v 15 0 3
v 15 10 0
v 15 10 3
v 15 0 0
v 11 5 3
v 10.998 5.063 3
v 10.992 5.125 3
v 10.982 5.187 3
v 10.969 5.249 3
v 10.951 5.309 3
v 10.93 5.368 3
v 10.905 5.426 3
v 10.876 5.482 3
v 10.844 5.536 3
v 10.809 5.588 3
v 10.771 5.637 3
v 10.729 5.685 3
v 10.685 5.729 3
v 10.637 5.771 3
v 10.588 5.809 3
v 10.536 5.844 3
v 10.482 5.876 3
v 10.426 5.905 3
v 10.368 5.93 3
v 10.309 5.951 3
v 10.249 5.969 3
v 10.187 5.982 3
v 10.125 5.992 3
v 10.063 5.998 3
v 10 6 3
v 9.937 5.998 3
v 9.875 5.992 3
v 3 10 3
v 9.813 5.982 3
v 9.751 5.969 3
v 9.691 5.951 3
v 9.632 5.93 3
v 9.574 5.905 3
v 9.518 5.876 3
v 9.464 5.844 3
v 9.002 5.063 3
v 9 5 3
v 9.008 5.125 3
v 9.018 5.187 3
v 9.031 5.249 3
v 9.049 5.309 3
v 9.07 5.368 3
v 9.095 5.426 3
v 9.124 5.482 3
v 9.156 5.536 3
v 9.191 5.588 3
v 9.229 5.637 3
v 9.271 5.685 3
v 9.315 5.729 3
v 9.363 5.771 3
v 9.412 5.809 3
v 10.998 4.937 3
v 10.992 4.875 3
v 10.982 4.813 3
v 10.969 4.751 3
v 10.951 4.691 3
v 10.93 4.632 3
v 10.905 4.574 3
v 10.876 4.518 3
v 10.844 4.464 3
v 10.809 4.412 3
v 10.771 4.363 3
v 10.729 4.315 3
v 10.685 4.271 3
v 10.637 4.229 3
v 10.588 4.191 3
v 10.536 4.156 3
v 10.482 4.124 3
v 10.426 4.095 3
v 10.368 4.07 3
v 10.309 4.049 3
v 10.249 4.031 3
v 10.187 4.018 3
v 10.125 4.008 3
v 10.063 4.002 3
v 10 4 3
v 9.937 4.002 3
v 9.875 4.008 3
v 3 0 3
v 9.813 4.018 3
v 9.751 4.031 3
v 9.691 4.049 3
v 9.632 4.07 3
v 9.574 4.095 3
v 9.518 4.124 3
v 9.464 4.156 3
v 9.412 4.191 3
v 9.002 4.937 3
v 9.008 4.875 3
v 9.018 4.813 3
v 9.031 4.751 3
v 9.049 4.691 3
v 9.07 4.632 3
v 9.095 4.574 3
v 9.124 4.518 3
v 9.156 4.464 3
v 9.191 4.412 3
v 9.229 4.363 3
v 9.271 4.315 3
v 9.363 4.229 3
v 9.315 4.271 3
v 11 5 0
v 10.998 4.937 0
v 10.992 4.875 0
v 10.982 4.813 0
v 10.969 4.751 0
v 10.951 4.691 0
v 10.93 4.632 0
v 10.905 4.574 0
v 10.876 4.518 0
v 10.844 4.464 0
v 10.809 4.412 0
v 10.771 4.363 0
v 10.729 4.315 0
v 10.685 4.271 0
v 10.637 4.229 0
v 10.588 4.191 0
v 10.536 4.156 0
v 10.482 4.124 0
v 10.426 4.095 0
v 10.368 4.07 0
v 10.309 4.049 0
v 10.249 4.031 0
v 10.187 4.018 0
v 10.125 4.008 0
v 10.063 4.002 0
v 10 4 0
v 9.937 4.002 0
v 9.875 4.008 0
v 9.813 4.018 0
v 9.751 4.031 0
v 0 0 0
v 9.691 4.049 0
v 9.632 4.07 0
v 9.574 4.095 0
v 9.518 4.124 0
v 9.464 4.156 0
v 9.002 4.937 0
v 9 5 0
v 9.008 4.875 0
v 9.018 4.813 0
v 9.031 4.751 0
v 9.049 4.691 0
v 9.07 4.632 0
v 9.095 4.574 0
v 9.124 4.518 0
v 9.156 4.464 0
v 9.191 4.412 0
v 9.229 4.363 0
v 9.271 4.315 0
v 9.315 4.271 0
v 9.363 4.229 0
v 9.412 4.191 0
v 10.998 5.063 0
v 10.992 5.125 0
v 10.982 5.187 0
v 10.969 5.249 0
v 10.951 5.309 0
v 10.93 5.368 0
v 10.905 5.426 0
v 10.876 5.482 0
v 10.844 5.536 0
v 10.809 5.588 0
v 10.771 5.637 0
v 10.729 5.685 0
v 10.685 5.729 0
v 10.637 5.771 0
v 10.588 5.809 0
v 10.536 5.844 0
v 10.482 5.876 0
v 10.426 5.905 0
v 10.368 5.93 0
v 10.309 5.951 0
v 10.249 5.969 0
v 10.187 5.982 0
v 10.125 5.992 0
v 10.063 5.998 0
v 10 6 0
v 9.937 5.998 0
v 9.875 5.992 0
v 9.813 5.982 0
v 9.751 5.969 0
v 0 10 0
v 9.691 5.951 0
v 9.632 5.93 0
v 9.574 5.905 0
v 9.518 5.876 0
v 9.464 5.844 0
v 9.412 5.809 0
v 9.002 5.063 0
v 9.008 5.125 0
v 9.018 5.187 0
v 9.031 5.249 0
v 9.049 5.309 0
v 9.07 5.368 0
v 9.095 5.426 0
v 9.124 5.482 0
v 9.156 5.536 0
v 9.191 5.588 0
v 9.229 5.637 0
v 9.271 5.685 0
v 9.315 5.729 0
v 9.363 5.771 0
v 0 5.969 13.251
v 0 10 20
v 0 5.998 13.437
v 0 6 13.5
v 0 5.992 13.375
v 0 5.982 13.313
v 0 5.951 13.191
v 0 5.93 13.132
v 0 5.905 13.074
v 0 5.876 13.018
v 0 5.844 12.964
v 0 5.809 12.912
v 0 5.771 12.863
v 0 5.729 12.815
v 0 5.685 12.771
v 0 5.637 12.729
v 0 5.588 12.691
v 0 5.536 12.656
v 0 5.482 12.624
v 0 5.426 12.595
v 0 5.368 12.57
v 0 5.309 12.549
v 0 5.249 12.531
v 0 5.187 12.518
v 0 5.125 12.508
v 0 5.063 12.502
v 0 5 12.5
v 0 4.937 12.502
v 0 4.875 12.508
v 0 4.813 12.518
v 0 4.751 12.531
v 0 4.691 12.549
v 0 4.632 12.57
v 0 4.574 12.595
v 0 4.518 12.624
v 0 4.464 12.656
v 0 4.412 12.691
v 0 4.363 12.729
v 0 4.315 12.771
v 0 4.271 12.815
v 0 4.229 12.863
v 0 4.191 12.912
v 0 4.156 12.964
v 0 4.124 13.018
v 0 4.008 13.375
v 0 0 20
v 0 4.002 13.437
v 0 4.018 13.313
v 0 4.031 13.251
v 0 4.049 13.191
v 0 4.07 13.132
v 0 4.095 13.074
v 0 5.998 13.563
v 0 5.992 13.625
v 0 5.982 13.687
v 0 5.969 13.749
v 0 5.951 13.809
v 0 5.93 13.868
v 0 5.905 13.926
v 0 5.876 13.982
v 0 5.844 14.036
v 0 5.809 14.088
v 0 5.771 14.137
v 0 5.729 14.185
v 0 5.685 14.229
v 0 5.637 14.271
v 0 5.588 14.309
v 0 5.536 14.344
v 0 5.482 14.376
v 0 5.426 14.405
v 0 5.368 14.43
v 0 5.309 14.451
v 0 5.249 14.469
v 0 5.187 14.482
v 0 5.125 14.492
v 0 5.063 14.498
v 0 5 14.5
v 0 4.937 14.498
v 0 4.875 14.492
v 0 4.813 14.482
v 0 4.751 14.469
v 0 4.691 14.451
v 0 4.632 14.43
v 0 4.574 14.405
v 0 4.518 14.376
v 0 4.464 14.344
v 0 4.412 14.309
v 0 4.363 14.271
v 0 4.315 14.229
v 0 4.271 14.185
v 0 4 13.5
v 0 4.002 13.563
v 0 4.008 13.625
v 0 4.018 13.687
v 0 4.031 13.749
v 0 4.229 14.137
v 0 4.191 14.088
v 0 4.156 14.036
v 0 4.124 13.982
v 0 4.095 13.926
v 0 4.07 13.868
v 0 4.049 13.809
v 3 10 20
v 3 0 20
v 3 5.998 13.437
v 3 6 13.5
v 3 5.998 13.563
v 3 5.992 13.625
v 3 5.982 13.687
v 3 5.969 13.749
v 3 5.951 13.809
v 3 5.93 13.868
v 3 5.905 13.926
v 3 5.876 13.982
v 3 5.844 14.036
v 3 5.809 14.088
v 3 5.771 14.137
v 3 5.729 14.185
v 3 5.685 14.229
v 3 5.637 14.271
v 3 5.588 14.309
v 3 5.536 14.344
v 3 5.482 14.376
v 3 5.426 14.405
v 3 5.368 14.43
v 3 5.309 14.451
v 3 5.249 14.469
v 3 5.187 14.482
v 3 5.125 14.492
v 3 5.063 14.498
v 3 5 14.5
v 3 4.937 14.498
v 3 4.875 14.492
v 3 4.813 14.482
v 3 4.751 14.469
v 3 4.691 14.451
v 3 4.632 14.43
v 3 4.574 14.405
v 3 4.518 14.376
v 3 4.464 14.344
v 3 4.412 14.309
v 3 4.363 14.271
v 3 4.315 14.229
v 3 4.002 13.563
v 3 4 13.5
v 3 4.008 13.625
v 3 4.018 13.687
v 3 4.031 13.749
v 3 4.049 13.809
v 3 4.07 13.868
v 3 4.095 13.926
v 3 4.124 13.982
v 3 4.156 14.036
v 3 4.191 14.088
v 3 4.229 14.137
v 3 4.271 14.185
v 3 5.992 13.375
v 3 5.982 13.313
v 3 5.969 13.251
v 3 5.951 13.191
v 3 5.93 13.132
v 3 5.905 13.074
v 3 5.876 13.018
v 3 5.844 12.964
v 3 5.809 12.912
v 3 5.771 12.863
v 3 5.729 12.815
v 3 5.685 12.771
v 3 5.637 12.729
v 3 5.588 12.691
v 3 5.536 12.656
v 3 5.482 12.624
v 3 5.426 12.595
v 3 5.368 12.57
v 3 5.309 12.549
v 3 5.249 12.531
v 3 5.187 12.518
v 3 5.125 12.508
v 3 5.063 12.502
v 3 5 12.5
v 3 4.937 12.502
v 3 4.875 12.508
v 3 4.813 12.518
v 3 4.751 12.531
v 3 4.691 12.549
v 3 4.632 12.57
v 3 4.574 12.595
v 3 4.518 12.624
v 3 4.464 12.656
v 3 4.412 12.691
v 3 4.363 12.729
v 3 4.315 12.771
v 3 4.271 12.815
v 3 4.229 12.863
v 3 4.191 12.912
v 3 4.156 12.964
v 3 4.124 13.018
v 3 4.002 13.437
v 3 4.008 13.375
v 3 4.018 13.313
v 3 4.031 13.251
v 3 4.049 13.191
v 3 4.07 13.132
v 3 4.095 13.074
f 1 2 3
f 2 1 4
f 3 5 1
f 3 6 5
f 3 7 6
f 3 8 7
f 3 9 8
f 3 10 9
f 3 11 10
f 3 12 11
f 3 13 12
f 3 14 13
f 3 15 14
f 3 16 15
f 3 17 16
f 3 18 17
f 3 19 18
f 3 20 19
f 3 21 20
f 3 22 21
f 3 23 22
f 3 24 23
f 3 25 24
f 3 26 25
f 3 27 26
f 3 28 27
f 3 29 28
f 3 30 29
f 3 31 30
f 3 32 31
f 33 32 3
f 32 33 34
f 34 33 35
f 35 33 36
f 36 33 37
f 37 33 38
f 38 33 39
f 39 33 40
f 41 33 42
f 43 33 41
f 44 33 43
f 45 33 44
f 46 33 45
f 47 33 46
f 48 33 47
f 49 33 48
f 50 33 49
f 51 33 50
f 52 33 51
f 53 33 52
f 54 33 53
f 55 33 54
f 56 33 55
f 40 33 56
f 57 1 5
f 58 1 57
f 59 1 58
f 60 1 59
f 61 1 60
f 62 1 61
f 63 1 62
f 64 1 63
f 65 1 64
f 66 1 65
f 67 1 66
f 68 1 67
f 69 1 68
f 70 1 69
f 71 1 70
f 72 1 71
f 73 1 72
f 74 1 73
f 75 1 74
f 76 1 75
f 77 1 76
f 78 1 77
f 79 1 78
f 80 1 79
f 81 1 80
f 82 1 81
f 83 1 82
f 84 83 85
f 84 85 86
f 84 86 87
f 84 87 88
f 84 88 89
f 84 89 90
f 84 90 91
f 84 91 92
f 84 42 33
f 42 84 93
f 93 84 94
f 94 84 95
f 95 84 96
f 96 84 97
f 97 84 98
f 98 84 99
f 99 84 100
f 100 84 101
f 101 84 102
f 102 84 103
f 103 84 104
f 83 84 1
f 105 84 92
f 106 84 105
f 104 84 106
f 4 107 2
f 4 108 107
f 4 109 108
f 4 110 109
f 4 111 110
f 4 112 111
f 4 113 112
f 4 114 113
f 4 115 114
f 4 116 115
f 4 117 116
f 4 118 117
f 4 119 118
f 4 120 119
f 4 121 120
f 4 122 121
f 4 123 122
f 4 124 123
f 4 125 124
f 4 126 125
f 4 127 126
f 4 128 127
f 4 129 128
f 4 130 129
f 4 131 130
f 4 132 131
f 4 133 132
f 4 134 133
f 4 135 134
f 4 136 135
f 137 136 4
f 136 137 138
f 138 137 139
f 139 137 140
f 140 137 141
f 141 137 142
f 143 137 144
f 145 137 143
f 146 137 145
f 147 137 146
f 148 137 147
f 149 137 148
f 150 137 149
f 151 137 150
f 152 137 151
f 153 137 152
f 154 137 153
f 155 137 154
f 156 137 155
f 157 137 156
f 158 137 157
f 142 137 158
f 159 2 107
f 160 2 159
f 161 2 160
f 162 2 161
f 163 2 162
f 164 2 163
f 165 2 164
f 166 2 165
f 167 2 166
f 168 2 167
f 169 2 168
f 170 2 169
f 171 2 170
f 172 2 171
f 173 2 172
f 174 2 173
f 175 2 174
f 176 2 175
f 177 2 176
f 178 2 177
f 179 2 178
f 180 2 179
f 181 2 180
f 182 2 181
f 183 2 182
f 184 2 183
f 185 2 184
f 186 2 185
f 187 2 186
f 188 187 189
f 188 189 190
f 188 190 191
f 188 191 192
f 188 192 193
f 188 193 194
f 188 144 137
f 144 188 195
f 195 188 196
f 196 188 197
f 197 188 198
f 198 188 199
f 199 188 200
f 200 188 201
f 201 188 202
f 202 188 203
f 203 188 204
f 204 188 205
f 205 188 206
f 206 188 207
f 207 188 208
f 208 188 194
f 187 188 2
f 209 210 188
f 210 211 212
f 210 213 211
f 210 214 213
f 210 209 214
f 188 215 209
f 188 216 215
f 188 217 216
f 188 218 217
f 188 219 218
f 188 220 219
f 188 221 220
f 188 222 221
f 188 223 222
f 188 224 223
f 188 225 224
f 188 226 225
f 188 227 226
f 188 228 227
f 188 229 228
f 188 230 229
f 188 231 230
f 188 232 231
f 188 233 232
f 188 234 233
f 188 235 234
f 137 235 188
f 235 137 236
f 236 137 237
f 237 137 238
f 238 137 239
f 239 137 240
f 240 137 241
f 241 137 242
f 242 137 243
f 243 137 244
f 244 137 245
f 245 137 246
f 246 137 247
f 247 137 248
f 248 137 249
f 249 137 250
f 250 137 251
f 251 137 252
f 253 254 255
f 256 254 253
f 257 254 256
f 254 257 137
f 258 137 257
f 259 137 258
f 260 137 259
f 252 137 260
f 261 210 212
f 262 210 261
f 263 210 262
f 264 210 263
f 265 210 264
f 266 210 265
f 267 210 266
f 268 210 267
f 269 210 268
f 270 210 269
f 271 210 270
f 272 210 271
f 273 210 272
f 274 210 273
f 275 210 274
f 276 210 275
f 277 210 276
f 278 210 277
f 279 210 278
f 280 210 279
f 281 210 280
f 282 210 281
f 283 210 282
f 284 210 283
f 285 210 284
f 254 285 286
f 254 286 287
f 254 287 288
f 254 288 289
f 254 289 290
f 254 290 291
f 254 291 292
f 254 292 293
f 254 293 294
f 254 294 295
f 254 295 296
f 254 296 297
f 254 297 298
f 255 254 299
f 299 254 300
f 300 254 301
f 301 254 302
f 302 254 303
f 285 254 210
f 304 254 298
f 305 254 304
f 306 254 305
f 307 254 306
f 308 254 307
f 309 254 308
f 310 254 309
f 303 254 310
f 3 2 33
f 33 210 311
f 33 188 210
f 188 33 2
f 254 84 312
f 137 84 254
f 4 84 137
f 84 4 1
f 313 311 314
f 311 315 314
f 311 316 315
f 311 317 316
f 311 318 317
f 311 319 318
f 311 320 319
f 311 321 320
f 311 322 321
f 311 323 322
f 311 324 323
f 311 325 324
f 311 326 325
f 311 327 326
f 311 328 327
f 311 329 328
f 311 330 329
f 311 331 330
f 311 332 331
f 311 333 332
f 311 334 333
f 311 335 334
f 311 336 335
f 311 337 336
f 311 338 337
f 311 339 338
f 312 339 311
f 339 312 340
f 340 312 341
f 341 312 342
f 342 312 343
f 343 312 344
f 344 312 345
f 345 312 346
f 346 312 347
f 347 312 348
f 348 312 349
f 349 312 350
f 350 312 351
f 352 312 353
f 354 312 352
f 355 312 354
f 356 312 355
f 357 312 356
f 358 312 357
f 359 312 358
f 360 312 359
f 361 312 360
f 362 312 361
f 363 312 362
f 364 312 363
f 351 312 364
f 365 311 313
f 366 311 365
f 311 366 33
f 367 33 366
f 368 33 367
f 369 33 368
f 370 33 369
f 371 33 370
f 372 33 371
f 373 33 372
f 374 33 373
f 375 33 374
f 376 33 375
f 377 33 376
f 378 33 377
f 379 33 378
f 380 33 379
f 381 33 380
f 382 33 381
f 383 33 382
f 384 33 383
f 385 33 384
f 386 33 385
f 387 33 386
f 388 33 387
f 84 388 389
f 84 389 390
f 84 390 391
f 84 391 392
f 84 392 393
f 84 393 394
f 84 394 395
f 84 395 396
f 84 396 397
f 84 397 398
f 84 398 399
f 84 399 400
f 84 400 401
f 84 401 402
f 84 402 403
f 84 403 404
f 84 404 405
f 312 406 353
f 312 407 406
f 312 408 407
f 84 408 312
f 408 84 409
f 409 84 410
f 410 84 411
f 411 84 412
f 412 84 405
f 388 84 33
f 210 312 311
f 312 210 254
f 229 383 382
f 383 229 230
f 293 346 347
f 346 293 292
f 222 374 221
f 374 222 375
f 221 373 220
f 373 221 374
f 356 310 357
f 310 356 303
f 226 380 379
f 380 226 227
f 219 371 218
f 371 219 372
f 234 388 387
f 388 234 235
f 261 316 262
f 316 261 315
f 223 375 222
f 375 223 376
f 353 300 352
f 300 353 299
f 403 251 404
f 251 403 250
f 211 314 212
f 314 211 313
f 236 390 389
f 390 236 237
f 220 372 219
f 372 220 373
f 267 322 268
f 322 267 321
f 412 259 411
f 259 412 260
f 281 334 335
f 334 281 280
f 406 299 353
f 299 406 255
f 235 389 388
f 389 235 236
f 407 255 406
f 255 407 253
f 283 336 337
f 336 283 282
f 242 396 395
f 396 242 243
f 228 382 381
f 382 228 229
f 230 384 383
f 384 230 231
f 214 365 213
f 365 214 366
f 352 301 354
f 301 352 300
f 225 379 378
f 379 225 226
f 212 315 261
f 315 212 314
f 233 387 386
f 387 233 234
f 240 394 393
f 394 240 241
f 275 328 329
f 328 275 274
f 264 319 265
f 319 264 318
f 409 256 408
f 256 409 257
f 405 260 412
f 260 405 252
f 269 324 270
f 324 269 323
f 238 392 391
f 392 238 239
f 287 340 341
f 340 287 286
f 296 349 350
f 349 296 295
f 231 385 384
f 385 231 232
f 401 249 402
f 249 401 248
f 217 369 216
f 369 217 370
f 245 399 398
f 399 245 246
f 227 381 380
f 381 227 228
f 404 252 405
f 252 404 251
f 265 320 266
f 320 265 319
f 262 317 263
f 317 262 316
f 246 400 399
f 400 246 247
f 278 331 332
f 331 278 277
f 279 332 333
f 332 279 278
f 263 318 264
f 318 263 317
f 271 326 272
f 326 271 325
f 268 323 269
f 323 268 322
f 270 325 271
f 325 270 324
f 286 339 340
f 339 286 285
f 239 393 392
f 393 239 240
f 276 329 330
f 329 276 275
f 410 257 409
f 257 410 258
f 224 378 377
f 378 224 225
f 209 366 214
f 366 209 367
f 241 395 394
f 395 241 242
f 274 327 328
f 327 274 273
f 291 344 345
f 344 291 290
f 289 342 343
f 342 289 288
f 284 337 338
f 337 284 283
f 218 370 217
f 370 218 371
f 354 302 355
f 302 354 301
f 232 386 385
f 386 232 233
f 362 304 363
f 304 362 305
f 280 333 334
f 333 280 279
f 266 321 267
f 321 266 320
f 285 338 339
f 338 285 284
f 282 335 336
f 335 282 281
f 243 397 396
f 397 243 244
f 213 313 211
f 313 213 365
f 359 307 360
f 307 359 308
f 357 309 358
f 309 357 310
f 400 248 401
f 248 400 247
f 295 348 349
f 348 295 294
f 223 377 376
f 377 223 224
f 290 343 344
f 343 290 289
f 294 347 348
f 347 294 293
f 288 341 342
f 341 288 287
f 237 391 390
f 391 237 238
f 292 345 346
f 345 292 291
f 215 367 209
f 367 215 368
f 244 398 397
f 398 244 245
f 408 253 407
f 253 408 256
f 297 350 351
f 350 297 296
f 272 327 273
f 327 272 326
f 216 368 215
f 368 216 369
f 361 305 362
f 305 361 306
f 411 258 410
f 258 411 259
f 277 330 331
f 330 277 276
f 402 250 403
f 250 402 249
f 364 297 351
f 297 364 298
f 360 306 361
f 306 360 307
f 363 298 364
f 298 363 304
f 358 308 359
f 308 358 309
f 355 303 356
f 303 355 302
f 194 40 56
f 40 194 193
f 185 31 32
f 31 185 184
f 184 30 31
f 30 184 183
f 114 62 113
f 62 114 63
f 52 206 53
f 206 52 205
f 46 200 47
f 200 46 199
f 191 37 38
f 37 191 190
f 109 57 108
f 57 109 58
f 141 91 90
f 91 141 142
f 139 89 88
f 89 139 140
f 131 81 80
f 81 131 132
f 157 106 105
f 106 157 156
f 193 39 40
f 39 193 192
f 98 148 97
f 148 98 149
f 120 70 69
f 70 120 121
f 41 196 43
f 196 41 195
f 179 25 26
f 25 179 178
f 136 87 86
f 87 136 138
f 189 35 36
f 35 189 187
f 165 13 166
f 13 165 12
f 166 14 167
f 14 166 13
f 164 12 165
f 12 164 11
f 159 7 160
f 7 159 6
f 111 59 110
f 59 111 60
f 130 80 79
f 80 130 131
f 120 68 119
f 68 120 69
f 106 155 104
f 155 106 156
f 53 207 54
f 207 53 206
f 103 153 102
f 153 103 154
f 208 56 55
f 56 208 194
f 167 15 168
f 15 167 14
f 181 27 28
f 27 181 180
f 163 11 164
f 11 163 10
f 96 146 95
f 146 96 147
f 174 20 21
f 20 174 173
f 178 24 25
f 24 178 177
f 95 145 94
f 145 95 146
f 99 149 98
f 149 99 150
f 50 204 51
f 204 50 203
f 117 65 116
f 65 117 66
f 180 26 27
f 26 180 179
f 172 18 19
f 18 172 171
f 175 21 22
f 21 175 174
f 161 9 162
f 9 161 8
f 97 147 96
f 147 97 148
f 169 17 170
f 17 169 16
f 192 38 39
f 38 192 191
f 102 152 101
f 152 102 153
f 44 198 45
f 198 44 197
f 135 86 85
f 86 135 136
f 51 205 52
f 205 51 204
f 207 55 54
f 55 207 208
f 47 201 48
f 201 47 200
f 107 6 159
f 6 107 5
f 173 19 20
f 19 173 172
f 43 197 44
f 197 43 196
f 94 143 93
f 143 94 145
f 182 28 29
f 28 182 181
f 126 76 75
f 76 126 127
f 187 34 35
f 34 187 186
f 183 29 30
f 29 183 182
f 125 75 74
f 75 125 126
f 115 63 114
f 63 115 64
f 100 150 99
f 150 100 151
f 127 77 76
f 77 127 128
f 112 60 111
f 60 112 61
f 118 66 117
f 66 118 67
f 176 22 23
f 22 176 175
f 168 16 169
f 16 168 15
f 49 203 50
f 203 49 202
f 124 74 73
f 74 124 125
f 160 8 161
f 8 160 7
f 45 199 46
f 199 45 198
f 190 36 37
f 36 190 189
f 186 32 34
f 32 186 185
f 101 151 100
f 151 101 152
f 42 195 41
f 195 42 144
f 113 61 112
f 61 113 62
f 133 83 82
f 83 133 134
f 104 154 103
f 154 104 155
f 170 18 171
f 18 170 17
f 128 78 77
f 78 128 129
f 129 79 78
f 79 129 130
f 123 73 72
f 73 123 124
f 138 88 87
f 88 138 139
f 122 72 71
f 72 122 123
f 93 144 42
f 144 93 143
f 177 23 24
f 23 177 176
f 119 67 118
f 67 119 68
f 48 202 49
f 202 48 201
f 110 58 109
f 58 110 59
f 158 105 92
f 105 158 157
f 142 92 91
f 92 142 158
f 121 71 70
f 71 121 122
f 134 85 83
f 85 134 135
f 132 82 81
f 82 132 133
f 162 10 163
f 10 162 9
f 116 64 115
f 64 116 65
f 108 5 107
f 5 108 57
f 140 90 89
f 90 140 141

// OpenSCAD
difference(){
	union(){


        translate([0,0,0]){
           cube([15,10,3], center=false);
        }	   
        translate([0,0,0]){
           cube([3,10,20], center=false);
        }	   
	   

 
	}
	union() {

       translate([0,5,13.5]){
            rotate(a = [0,90,0]) {
                cylinder(h=600, r=1.0, $fn=100, center=true);
            }
       }   
       translate([10,5,0]){
            rotate(a = [0,0,90]) {
                cylinder(h=600, r=1.0, $fn=100, center=true);
            }
       }   


        
	}
}
